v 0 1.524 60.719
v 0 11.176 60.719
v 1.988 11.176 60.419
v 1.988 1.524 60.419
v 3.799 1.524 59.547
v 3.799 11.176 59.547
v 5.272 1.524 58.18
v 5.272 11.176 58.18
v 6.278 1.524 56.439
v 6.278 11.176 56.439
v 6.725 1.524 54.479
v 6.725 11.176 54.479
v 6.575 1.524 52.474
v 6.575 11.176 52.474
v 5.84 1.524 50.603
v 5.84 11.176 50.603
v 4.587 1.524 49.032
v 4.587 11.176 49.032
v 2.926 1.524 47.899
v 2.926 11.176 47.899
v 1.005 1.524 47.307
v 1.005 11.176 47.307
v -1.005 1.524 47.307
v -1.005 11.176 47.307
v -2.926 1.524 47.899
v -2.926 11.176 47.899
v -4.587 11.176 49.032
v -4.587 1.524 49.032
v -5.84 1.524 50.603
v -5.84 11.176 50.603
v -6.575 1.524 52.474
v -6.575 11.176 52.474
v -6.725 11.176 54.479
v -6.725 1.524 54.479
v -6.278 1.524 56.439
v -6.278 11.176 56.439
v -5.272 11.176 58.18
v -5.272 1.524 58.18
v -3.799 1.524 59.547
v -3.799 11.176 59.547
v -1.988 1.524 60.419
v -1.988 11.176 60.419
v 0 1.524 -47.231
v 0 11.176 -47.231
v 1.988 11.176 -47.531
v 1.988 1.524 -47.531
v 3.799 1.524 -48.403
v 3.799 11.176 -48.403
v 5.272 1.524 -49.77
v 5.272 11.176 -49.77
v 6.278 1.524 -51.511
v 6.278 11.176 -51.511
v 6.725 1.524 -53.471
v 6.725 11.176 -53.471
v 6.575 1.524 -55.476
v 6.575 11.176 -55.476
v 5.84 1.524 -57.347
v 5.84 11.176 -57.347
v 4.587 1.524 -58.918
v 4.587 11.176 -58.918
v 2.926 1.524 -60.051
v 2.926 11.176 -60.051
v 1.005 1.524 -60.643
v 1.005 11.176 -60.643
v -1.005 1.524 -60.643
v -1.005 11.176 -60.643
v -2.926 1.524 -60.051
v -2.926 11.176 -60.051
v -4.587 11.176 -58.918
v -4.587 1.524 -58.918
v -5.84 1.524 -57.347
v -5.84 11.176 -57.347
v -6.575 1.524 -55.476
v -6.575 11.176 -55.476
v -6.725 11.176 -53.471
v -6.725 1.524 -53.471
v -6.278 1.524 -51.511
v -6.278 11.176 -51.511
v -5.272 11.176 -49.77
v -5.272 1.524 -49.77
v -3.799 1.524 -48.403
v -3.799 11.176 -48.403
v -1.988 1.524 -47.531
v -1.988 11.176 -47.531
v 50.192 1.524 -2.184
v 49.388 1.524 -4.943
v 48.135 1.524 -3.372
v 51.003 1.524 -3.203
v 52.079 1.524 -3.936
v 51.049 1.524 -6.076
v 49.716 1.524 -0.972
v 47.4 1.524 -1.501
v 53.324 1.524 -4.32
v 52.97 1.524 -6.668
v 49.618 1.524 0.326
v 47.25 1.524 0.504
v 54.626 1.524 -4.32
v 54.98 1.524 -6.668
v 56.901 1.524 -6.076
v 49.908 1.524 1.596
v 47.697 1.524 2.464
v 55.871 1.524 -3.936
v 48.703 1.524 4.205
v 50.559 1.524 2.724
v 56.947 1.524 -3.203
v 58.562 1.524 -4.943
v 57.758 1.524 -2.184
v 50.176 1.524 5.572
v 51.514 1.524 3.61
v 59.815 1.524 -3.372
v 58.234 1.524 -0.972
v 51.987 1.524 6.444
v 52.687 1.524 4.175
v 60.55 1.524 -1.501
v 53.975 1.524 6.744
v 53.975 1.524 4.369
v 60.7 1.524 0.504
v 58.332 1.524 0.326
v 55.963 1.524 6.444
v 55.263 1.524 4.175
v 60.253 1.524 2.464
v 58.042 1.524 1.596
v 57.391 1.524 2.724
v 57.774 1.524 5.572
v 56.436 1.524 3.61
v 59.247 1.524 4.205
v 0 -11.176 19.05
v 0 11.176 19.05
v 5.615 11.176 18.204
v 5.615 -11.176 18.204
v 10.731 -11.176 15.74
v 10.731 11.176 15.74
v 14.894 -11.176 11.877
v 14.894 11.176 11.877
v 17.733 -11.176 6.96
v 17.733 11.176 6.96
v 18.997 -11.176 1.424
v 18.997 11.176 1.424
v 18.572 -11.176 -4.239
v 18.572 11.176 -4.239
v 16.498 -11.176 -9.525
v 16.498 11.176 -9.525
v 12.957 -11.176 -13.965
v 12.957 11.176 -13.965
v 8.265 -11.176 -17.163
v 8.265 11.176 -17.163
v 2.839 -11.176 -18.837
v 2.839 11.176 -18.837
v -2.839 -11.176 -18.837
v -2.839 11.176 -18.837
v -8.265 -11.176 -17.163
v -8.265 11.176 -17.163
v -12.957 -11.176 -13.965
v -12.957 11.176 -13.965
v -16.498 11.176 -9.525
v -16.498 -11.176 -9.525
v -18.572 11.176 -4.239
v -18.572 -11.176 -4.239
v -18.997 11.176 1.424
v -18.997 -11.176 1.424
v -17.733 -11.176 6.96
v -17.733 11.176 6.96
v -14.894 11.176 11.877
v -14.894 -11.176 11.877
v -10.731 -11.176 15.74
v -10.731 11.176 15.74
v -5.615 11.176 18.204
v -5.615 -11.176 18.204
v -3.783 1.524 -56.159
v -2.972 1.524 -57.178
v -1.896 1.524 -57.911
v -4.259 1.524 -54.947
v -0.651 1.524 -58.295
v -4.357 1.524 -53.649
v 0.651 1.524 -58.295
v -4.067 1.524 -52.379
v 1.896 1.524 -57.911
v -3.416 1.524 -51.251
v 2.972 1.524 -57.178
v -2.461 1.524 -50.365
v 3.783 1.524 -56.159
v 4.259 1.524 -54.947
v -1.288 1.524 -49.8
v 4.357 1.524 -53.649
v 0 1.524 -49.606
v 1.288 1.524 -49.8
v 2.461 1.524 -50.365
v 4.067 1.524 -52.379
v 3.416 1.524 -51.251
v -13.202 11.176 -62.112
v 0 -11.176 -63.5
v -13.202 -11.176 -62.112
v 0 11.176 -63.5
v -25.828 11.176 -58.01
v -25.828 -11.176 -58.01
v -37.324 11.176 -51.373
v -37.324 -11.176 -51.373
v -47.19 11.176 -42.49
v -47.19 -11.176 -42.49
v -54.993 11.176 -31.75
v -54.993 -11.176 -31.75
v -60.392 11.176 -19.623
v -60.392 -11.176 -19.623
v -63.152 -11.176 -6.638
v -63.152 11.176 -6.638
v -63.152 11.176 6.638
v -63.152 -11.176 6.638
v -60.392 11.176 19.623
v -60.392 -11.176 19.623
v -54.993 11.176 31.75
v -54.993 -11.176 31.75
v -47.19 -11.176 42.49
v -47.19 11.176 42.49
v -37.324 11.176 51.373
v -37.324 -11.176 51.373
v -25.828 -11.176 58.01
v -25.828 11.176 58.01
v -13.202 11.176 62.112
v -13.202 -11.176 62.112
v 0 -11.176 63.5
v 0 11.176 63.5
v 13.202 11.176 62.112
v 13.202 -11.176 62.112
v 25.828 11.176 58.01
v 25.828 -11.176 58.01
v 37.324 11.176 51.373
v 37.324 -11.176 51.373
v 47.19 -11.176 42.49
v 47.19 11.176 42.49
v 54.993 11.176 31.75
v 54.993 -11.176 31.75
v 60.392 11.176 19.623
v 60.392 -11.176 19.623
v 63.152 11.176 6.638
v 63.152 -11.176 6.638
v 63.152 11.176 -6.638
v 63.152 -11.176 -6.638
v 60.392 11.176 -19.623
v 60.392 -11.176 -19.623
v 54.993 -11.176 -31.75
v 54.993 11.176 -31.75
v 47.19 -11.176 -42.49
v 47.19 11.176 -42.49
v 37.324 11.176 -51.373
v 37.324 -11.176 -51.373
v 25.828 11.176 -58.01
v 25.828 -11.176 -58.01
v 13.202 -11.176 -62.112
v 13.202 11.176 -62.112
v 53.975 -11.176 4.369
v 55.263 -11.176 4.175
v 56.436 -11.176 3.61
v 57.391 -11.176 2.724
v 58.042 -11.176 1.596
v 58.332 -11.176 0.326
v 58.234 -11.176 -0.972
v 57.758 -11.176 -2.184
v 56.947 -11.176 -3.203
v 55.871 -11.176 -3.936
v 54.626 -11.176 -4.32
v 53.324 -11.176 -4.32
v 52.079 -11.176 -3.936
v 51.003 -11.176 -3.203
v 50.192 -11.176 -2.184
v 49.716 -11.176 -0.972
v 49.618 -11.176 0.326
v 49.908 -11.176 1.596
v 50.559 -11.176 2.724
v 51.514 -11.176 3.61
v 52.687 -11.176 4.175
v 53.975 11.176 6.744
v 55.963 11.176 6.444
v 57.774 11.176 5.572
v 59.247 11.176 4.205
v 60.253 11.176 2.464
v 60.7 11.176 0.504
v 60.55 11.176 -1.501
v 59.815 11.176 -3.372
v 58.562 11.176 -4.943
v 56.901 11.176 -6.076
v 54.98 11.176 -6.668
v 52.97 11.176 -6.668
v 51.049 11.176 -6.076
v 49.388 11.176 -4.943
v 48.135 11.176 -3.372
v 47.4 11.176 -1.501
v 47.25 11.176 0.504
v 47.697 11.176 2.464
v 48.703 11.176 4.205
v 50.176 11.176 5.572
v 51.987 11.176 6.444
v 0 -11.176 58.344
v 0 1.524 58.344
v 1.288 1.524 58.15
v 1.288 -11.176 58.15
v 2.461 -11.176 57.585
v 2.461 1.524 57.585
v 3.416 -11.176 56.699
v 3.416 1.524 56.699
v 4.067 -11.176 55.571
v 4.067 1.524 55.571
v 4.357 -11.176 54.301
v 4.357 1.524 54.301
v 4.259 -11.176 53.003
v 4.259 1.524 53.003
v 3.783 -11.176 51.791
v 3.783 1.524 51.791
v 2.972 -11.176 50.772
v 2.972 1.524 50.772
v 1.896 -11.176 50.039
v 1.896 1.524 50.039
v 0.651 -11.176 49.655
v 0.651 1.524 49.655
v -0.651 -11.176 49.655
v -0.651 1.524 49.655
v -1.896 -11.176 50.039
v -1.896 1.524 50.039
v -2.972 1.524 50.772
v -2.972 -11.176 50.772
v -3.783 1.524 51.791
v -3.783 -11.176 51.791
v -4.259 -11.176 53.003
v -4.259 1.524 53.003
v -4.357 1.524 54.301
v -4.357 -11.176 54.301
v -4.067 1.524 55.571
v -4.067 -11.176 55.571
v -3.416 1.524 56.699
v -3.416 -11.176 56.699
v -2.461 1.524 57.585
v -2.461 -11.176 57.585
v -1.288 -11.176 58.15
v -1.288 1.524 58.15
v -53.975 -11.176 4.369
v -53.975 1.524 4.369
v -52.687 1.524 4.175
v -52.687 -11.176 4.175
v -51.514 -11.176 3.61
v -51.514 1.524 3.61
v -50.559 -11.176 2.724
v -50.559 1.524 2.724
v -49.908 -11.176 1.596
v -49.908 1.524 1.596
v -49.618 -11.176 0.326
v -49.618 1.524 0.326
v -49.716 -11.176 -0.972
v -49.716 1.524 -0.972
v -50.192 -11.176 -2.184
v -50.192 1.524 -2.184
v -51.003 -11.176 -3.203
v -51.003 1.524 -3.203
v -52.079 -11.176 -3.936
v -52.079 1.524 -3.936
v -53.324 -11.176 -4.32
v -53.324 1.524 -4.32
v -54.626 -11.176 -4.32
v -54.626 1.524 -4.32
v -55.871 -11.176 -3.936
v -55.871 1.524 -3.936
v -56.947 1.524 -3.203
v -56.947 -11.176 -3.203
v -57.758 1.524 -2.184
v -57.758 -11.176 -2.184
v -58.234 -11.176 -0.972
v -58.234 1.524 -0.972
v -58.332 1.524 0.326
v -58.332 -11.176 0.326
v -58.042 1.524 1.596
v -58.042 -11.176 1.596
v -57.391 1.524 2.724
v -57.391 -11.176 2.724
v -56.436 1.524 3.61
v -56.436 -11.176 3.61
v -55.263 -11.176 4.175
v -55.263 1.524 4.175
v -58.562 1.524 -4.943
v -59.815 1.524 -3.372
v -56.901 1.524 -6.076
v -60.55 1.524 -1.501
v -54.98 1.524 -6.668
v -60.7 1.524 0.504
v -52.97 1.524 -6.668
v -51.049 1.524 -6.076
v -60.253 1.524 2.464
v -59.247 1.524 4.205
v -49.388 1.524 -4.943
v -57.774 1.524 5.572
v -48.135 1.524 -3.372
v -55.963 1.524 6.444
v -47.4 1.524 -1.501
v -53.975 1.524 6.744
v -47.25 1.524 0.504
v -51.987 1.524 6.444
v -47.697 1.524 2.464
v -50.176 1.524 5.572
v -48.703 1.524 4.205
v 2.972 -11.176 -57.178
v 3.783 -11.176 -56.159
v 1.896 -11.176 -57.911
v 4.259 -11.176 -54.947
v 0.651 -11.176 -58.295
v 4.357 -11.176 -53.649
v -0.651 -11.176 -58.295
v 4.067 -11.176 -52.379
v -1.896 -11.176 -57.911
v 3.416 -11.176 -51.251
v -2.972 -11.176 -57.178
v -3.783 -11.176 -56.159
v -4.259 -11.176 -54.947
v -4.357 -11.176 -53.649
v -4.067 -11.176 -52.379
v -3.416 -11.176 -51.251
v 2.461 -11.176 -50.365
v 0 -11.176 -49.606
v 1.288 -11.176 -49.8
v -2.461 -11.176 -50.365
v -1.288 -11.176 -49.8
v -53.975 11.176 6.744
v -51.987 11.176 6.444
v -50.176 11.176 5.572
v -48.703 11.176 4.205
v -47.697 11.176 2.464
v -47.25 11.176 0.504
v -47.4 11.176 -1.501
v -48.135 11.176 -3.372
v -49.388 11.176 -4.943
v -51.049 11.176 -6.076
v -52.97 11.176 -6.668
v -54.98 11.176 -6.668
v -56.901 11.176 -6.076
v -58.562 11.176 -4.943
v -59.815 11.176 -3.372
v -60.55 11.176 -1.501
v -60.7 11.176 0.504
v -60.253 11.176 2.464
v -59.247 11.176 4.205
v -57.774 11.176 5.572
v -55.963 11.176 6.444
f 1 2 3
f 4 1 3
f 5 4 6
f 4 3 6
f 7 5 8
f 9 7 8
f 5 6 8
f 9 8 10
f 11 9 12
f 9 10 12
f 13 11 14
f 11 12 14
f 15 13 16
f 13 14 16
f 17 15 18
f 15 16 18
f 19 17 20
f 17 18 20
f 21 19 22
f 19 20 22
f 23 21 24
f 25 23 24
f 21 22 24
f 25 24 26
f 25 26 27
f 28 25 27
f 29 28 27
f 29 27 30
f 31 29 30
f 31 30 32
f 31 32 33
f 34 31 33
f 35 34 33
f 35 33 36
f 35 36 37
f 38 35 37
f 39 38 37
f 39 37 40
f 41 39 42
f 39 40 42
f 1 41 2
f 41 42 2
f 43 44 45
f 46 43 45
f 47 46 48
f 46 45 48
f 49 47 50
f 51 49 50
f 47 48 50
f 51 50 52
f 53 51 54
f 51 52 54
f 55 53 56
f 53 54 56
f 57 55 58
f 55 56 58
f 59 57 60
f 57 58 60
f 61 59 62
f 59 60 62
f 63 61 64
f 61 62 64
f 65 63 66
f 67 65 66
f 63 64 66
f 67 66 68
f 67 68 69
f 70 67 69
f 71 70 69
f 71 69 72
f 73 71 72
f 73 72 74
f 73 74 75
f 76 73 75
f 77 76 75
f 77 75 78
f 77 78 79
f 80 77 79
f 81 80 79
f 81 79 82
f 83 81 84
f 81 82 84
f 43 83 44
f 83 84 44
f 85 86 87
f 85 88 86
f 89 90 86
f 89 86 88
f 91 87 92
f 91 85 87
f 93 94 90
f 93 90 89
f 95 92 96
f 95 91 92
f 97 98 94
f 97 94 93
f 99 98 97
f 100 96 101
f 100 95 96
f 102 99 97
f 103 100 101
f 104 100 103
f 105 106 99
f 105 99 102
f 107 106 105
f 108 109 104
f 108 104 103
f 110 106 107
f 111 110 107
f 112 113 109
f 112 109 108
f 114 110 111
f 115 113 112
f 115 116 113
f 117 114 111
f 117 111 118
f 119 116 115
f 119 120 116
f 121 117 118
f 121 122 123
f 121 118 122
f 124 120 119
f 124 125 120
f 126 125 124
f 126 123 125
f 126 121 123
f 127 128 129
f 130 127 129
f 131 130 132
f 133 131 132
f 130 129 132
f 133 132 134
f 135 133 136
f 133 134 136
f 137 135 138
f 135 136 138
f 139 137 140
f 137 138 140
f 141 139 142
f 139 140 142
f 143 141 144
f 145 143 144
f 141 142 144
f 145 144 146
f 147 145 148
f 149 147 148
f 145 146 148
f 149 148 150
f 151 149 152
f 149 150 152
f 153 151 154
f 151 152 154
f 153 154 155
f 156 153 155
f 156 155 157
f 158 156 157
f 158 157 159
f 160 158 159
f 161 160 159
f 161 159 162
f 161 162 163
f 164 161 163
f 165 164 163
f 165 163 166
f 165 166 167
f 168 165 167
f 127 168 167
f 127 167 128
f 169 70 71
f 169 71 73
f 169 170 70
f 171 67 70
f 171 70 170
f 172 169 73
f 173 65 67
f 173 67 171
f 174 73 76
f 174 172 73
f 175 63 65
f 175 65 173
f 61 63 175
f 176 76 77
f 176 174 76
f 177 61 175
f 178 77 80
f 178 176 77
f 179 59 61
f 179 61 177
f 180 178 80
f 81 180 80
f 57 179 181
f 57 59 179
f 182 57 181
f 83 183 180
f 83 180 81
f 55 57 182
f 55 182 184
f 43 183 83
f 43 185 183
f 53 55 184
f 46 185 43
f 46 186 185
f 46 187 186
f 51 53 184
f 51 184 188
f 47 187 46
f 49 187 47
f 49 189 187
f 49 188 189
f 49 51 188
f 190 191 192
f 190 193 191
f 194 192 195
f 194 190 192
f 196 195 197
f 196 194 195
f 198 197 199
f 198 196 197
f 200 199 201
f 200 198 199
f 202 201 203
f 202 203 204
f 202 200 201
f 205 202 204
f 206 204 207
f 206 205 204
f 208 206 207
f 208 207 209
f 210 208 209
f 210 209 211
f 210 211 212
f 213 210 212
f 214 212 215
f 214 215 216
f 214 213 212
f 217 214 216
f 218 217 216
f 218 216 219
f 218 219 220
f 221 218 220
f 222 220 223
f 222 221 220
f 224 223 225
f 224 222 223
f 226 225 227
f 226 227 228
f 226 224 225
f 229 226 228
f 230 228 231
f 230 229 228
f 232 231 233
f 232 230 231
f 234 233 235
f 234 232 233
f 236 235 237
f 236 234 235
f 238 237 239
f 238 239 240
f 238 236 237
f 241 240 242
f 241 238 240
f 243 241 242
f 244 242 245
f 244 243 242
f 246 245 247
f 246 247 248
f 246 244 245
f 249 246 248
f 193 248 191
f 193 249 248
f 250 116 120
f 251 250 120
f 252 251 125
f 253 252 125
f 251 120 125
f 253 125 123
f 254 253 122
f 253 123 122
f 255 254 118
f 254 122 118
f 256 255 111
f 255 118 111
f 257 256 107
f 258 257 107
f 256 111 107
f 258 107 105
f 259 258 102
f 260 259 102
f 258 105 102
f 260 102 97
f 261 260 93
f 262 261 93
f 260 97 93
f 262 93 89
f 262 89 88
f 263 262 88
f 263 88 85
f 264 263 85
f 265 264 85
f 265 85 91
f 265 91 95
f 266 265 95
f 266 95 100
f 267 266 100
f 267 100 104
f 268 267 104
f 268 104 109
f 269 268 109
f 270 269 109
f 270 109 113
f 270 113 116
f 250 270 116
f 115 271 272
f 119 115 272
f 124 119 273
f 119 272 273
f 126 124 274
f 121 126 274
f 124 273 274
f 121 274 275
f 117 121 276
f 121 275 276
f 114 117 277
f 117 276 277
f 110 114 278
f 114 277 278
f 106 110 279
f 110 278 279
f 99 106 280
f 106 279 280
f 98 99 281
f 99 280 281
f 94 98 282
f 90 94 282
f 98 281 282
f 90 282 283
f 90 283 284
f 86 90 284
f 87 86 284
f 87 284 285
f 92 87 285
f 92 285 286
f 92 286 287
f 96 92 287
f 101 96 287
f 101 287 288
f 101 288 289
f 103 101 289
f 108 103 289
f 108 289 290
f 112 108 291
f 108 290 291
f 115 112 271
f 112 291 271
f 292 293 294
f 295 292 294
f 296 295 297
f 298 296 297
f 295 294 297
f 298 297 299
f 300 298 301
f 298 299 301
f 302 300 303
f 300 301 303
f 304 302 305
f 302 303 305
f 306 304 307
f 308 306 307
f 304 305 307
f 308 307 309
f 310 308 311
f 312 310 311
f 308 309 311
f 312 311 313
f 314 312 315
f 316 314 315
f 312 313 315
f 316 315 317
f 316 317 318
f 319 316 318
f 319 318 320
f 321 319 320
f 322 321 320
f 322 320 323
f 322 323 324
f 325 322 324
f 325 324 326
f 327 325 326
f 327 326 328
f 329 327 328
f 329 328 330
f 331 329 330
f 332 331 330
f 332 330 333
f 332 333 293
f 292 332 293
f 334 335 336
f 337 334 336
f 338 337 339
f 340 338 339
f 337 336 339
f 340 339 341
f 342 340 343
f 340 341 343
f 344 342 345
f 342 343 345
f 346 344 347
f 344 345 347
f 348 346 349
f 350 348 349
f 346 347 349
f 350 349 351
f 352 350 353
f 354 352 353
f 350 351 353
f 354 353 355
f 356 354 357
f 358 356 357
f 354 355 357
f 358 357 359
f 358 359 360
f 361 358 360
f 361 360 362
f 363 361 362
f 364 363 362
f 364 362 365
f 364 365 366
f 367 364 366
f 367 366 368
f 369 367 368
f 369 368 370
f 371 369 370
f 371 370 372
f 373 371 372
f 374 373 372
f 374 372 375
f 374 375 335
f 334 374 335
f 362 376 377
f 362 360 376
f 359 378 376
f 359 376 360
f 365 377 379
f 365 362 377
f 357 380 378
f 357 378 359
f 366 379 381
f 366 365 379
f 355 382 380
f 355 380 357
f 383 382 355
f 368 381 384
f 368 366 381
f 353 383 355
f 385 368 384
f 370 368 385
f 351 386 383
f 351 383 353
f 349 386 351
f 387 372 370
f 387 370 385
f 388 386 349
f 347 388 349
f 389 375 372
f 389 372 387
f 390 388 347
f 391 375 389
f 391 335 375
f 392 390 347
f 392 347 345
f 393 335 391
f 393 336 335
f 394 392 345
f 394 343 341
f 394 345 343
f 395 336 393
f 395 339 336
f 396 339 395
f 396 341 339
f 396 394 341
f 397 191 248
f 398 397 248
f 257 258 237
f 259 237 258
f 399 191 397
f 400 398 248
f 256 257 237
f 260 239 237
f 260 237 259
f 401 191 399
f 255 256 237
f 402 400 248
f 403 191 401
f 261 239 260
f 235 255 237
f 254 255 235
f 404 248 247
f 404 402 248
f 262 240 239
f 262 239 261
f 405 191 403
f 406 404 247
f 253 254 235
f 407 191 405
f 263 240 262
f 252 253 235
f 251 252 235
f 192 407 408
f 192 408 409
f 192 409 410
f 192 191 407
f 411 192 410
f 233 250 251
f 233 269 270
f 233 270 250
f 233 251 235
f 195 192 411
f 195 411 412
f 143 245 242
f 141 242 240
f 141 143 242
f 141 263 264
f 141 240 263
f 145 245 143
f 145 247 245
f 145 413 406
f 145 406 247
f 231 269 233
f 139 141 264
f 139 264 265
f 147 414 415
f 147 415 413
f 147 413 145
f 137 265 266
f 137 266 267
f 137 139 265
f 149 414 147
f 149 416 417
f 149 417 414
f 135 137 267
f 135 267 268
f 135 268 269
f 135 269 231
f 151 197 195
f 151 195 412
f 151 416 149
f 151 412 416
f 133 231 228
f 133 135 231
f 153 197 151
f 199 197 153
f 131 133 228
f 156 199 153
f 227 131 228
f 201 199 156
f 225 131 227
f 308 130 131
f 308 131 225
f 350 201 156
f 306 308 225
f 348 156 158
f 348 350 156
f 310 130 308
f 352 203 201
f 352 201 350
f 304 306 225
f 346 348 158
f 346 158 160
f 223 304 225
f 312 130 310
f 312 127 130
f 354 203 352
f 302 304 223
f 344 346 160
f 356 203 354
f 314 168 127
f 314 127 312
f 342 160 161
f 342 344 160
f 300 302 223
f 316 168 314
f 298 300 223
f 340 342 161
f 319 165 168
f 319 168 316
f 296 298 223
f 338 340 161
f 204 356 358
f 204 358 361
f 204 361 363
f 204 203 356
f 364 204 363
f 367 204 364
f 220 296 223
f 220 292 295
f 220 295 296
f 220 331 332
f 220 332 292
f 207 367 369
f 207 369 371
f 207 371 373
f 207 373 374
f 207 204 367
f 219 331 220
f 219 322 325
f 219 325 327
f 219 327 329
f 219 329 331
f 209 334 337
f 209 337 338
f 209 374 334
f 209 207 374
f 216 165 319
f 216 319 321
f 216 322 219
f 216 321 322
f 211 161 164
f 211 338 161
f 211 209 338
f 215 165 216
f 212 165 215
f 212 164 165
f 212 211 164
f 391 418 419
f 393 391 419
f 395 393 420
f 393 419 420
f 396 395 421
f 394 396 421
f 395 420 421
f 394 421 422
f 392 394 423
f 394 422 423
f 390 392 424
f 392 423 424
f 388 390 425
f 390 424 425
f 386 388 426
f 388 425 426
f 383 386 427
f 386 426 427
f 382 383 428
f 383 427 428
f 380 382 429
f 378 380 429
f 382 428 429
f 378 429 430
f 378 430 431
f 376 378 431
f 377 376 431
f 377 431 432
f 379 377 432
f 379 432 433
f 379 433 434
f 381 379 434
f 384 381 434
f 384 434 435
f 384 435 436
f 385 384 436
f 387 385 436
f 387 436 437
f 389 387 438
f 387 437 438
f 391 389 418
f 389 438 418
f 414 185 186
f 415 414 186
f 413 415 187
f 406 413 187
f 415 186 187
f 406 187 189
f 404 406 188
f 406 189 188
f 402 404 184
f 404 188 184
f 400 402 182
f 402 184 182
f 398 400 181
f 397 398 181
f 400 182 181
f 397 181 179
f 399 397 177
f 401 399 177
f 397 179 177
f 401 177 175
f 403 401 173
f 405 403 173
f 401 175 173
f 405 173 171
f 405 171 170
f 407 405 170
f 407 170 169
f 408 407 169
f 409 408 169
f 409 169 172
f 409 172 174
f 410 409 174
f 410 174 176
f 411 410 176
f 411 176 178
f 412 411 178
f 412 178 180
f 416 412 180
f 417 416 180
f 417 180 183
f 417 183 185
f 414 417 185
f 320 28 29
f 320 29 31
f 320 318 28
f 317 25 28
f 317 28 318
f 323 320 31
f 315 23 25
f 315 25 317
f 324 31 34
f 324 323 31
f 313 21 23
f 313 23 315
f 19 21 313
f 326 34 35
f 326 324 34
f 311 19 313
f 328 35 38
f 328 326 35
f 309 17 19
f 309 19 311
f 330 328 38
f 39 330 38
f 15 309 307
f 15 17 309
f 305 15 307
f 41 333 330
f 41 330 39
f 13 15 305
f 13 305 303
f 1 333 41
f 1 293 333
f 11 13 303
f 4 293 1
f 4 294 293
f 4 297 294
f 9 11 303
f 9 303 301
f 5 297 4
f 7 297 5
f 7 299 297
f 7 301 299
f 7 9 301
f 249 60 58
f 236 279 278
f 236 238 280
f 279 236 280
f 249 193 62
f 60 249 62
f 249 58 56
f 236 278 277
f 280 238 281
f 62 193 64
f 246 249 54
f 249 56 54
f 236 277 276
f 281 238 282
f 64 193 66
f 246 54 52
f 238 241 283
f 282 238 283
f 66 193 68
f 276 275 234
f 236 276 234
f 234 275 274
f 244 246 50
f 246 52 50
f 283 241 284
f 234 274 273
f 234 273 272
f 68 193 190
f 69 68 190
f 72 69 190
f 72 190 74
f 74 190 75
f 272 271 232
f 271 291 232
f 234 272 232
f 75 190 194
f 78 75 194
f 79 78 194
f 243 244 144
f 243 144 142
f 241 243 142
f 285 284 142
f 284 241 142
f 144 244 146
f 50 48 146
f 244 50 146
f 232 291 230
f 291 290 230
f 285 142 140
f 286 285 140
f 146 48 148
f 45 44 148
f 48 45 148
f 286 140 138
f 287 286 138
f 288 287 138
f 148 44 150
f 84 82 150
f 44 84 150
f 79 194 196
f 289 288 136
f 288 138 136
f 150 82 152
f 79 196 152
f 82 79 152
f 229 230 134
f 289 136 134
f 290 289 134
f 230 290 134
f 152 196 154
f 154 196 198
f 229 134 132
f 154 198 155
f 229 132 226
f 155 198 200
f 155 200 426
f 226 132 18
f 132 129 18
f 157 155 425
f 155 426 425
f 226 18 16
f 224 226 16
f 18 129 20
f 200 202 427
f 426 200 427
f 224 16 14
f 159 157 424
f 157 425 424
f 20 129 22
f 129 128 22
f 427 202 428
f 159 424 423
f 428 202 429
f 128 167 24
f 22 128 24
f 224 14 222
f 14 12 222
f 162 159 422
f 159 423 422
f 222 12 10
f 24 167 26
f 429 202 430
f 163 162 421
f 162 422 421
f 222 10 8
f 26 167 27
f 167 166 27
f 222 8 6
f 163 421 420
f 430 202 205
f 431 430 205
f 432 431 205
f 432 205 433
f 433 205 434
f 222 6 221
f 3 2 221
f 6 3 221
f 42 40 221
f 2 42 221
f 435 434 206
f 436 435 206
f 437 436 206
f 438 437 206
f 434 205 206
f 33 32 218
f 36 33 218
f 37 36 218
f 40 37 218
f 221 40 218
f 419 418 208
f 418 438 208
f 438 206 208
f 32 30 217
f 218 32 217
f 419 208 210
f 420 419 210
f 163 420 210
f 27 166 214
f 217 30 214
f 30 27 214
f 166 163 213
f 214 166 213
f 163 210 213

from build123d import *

# Parameters (mm, degrees)
SKETCH1_W           = 22.352
SKETCH1_H           = 63.5
CUT_EXTRUDE2_START  = 11.176
SKETCH2_R           = 19.05
CUT_EXTRUDE2_DEPTH  = 102.671320188
CUT_EXTRUDE4_START  = 11.176
SKETCH3_R           = 4.3688
CUT_EXTRUDE4_DEPTH  = 127
CUT_EXTRUDE6_START  = 11.176
SKETCH4_R           = 6.7437
CUT_EXTRUDE6_DEPTH  = 9.652
CUT_EXTRUDE8_START  = 11.176
SKETCH5_R           = 4.3688
CUT_EXTRUDE8_DEPTH  = 127
CUT_EXTRUDE10_START = 11.176
SKETCH6_R           = 6.7437
CUT_EXTRUDE10_DEPTH = 9.652


with BuildPart() as part:
    # Sketch1 → Revolve1 (revolve)
    with BuildSketch(Plane(origin=(0, 0, 0), x_dir=(0, 1, 0), z_dir=(0, 0, 1)), mode=Mode.PRIVATE) as revolve1_sk:
        with Locations((0, 31.75)):
            Rectangle(SKETCH1_W, SKETCH1_H)
    revolve(revolve1_sk.sketch.rotate(Axis((0, -36.576, 0), (0, 1, 0)), 270), axis=Axis((0, -36.576, 0), (0, 1, 0)))

    # Sketch2 → Cut-Extrude2 (cut, through all)
    with BuildSketch(Plane(origin=(0, 0, 0), x_dir=(-1, 0, 0), z_dir=(0, 1, 0)).offset(CUT_EXTRUDE2_START)):
        with Locations(Location((0, 0, 0), (0, 0, 90))):
            Circle(SKETCH2_R)
    extrude(amount=-CUT_EXTRUDE2_DEPTH, mode=Mode.SUBTRACT)

    # Sketch3 → Cut-Extrude4 (cut)
    with BuildSketch(Plane(origin=(0, 0, 0), x_dir=(-1, 0, 0), z_dir=(0, 1, 0)).offset(CUT_EXTRUDE4_START)):
        with Locations(Location((53.975, 0, 0), (0, 0, 90))):
            Circle(SKETCH3_R)
    extrude(amount=-CUT_EXTRUDE4_DEPTH, mode=Mode.SUBTRACT)

    # Sketch4 → Cut-Extrude6 (cut)
    with BuildSketch(Plane(origin=(0, 0, 0), x_dir=(-1, 0, 0), z_dir=(0, 1, 0)).offset(CUT_EXTRUDE6_START)):
        with Locations(Location((53.975, 0, 0), (0, 0, 90))):
            Circle(SKETCH4_R)
    extrude(amount=-CUT_EXTRUDE6_DEPTH, mode=Mode.SUBTRACT)

    # Sketch5 → Cut-Extrude8 (cut)
    with BuildSketch(Plane(origin=(0, 0, 0), x_dir=(-1, 0, 0), z_dir=(0, 1, 0)).offset(CUT_EXTRUDE8_START)):
        with Locations(Location((0, 53.975, 0), (0, 0, 90))):
            Circle(SKETCH5_R)
        with Locations(Location((-53.975, 0, 0), (0, 0, 90))):
            Circle(SKETCH5_R)
        with Locations(Location((0, -53.975, 0), (0, 0, 90))):
            Circle(SKETCH5_R)
    extrude(amount=-CUT_EXTRUDE8_DEPTH, mode=Mode.SUBTRACT)

    # Sketch6 → Cut-Extrude10 (cut)
    with BuildSketch(Plane(origin=(0, 0, 0), x_dir=(-1, 0, 0), z_dir=(0, 1, 0)).offset(CUT_EXTRUDE10_START)):
        with Locations(Location((0, 53.975, 0), (0, 0, 90))):
            Circle(SKETCH6_R)
        with Locations(Location((-53.975, 0, 0), (0, 0, 90))):
            Circle(SKETCH6_R)
        with Locations(Location((0, -53.975, 0), (0, 0, 90))):
            Circle(SKETCH6_R)
    extrude(amount=-CUT_EXTRUDE10_DEPTH, mode=Mode.SUBTRACT)


solid = part.part
